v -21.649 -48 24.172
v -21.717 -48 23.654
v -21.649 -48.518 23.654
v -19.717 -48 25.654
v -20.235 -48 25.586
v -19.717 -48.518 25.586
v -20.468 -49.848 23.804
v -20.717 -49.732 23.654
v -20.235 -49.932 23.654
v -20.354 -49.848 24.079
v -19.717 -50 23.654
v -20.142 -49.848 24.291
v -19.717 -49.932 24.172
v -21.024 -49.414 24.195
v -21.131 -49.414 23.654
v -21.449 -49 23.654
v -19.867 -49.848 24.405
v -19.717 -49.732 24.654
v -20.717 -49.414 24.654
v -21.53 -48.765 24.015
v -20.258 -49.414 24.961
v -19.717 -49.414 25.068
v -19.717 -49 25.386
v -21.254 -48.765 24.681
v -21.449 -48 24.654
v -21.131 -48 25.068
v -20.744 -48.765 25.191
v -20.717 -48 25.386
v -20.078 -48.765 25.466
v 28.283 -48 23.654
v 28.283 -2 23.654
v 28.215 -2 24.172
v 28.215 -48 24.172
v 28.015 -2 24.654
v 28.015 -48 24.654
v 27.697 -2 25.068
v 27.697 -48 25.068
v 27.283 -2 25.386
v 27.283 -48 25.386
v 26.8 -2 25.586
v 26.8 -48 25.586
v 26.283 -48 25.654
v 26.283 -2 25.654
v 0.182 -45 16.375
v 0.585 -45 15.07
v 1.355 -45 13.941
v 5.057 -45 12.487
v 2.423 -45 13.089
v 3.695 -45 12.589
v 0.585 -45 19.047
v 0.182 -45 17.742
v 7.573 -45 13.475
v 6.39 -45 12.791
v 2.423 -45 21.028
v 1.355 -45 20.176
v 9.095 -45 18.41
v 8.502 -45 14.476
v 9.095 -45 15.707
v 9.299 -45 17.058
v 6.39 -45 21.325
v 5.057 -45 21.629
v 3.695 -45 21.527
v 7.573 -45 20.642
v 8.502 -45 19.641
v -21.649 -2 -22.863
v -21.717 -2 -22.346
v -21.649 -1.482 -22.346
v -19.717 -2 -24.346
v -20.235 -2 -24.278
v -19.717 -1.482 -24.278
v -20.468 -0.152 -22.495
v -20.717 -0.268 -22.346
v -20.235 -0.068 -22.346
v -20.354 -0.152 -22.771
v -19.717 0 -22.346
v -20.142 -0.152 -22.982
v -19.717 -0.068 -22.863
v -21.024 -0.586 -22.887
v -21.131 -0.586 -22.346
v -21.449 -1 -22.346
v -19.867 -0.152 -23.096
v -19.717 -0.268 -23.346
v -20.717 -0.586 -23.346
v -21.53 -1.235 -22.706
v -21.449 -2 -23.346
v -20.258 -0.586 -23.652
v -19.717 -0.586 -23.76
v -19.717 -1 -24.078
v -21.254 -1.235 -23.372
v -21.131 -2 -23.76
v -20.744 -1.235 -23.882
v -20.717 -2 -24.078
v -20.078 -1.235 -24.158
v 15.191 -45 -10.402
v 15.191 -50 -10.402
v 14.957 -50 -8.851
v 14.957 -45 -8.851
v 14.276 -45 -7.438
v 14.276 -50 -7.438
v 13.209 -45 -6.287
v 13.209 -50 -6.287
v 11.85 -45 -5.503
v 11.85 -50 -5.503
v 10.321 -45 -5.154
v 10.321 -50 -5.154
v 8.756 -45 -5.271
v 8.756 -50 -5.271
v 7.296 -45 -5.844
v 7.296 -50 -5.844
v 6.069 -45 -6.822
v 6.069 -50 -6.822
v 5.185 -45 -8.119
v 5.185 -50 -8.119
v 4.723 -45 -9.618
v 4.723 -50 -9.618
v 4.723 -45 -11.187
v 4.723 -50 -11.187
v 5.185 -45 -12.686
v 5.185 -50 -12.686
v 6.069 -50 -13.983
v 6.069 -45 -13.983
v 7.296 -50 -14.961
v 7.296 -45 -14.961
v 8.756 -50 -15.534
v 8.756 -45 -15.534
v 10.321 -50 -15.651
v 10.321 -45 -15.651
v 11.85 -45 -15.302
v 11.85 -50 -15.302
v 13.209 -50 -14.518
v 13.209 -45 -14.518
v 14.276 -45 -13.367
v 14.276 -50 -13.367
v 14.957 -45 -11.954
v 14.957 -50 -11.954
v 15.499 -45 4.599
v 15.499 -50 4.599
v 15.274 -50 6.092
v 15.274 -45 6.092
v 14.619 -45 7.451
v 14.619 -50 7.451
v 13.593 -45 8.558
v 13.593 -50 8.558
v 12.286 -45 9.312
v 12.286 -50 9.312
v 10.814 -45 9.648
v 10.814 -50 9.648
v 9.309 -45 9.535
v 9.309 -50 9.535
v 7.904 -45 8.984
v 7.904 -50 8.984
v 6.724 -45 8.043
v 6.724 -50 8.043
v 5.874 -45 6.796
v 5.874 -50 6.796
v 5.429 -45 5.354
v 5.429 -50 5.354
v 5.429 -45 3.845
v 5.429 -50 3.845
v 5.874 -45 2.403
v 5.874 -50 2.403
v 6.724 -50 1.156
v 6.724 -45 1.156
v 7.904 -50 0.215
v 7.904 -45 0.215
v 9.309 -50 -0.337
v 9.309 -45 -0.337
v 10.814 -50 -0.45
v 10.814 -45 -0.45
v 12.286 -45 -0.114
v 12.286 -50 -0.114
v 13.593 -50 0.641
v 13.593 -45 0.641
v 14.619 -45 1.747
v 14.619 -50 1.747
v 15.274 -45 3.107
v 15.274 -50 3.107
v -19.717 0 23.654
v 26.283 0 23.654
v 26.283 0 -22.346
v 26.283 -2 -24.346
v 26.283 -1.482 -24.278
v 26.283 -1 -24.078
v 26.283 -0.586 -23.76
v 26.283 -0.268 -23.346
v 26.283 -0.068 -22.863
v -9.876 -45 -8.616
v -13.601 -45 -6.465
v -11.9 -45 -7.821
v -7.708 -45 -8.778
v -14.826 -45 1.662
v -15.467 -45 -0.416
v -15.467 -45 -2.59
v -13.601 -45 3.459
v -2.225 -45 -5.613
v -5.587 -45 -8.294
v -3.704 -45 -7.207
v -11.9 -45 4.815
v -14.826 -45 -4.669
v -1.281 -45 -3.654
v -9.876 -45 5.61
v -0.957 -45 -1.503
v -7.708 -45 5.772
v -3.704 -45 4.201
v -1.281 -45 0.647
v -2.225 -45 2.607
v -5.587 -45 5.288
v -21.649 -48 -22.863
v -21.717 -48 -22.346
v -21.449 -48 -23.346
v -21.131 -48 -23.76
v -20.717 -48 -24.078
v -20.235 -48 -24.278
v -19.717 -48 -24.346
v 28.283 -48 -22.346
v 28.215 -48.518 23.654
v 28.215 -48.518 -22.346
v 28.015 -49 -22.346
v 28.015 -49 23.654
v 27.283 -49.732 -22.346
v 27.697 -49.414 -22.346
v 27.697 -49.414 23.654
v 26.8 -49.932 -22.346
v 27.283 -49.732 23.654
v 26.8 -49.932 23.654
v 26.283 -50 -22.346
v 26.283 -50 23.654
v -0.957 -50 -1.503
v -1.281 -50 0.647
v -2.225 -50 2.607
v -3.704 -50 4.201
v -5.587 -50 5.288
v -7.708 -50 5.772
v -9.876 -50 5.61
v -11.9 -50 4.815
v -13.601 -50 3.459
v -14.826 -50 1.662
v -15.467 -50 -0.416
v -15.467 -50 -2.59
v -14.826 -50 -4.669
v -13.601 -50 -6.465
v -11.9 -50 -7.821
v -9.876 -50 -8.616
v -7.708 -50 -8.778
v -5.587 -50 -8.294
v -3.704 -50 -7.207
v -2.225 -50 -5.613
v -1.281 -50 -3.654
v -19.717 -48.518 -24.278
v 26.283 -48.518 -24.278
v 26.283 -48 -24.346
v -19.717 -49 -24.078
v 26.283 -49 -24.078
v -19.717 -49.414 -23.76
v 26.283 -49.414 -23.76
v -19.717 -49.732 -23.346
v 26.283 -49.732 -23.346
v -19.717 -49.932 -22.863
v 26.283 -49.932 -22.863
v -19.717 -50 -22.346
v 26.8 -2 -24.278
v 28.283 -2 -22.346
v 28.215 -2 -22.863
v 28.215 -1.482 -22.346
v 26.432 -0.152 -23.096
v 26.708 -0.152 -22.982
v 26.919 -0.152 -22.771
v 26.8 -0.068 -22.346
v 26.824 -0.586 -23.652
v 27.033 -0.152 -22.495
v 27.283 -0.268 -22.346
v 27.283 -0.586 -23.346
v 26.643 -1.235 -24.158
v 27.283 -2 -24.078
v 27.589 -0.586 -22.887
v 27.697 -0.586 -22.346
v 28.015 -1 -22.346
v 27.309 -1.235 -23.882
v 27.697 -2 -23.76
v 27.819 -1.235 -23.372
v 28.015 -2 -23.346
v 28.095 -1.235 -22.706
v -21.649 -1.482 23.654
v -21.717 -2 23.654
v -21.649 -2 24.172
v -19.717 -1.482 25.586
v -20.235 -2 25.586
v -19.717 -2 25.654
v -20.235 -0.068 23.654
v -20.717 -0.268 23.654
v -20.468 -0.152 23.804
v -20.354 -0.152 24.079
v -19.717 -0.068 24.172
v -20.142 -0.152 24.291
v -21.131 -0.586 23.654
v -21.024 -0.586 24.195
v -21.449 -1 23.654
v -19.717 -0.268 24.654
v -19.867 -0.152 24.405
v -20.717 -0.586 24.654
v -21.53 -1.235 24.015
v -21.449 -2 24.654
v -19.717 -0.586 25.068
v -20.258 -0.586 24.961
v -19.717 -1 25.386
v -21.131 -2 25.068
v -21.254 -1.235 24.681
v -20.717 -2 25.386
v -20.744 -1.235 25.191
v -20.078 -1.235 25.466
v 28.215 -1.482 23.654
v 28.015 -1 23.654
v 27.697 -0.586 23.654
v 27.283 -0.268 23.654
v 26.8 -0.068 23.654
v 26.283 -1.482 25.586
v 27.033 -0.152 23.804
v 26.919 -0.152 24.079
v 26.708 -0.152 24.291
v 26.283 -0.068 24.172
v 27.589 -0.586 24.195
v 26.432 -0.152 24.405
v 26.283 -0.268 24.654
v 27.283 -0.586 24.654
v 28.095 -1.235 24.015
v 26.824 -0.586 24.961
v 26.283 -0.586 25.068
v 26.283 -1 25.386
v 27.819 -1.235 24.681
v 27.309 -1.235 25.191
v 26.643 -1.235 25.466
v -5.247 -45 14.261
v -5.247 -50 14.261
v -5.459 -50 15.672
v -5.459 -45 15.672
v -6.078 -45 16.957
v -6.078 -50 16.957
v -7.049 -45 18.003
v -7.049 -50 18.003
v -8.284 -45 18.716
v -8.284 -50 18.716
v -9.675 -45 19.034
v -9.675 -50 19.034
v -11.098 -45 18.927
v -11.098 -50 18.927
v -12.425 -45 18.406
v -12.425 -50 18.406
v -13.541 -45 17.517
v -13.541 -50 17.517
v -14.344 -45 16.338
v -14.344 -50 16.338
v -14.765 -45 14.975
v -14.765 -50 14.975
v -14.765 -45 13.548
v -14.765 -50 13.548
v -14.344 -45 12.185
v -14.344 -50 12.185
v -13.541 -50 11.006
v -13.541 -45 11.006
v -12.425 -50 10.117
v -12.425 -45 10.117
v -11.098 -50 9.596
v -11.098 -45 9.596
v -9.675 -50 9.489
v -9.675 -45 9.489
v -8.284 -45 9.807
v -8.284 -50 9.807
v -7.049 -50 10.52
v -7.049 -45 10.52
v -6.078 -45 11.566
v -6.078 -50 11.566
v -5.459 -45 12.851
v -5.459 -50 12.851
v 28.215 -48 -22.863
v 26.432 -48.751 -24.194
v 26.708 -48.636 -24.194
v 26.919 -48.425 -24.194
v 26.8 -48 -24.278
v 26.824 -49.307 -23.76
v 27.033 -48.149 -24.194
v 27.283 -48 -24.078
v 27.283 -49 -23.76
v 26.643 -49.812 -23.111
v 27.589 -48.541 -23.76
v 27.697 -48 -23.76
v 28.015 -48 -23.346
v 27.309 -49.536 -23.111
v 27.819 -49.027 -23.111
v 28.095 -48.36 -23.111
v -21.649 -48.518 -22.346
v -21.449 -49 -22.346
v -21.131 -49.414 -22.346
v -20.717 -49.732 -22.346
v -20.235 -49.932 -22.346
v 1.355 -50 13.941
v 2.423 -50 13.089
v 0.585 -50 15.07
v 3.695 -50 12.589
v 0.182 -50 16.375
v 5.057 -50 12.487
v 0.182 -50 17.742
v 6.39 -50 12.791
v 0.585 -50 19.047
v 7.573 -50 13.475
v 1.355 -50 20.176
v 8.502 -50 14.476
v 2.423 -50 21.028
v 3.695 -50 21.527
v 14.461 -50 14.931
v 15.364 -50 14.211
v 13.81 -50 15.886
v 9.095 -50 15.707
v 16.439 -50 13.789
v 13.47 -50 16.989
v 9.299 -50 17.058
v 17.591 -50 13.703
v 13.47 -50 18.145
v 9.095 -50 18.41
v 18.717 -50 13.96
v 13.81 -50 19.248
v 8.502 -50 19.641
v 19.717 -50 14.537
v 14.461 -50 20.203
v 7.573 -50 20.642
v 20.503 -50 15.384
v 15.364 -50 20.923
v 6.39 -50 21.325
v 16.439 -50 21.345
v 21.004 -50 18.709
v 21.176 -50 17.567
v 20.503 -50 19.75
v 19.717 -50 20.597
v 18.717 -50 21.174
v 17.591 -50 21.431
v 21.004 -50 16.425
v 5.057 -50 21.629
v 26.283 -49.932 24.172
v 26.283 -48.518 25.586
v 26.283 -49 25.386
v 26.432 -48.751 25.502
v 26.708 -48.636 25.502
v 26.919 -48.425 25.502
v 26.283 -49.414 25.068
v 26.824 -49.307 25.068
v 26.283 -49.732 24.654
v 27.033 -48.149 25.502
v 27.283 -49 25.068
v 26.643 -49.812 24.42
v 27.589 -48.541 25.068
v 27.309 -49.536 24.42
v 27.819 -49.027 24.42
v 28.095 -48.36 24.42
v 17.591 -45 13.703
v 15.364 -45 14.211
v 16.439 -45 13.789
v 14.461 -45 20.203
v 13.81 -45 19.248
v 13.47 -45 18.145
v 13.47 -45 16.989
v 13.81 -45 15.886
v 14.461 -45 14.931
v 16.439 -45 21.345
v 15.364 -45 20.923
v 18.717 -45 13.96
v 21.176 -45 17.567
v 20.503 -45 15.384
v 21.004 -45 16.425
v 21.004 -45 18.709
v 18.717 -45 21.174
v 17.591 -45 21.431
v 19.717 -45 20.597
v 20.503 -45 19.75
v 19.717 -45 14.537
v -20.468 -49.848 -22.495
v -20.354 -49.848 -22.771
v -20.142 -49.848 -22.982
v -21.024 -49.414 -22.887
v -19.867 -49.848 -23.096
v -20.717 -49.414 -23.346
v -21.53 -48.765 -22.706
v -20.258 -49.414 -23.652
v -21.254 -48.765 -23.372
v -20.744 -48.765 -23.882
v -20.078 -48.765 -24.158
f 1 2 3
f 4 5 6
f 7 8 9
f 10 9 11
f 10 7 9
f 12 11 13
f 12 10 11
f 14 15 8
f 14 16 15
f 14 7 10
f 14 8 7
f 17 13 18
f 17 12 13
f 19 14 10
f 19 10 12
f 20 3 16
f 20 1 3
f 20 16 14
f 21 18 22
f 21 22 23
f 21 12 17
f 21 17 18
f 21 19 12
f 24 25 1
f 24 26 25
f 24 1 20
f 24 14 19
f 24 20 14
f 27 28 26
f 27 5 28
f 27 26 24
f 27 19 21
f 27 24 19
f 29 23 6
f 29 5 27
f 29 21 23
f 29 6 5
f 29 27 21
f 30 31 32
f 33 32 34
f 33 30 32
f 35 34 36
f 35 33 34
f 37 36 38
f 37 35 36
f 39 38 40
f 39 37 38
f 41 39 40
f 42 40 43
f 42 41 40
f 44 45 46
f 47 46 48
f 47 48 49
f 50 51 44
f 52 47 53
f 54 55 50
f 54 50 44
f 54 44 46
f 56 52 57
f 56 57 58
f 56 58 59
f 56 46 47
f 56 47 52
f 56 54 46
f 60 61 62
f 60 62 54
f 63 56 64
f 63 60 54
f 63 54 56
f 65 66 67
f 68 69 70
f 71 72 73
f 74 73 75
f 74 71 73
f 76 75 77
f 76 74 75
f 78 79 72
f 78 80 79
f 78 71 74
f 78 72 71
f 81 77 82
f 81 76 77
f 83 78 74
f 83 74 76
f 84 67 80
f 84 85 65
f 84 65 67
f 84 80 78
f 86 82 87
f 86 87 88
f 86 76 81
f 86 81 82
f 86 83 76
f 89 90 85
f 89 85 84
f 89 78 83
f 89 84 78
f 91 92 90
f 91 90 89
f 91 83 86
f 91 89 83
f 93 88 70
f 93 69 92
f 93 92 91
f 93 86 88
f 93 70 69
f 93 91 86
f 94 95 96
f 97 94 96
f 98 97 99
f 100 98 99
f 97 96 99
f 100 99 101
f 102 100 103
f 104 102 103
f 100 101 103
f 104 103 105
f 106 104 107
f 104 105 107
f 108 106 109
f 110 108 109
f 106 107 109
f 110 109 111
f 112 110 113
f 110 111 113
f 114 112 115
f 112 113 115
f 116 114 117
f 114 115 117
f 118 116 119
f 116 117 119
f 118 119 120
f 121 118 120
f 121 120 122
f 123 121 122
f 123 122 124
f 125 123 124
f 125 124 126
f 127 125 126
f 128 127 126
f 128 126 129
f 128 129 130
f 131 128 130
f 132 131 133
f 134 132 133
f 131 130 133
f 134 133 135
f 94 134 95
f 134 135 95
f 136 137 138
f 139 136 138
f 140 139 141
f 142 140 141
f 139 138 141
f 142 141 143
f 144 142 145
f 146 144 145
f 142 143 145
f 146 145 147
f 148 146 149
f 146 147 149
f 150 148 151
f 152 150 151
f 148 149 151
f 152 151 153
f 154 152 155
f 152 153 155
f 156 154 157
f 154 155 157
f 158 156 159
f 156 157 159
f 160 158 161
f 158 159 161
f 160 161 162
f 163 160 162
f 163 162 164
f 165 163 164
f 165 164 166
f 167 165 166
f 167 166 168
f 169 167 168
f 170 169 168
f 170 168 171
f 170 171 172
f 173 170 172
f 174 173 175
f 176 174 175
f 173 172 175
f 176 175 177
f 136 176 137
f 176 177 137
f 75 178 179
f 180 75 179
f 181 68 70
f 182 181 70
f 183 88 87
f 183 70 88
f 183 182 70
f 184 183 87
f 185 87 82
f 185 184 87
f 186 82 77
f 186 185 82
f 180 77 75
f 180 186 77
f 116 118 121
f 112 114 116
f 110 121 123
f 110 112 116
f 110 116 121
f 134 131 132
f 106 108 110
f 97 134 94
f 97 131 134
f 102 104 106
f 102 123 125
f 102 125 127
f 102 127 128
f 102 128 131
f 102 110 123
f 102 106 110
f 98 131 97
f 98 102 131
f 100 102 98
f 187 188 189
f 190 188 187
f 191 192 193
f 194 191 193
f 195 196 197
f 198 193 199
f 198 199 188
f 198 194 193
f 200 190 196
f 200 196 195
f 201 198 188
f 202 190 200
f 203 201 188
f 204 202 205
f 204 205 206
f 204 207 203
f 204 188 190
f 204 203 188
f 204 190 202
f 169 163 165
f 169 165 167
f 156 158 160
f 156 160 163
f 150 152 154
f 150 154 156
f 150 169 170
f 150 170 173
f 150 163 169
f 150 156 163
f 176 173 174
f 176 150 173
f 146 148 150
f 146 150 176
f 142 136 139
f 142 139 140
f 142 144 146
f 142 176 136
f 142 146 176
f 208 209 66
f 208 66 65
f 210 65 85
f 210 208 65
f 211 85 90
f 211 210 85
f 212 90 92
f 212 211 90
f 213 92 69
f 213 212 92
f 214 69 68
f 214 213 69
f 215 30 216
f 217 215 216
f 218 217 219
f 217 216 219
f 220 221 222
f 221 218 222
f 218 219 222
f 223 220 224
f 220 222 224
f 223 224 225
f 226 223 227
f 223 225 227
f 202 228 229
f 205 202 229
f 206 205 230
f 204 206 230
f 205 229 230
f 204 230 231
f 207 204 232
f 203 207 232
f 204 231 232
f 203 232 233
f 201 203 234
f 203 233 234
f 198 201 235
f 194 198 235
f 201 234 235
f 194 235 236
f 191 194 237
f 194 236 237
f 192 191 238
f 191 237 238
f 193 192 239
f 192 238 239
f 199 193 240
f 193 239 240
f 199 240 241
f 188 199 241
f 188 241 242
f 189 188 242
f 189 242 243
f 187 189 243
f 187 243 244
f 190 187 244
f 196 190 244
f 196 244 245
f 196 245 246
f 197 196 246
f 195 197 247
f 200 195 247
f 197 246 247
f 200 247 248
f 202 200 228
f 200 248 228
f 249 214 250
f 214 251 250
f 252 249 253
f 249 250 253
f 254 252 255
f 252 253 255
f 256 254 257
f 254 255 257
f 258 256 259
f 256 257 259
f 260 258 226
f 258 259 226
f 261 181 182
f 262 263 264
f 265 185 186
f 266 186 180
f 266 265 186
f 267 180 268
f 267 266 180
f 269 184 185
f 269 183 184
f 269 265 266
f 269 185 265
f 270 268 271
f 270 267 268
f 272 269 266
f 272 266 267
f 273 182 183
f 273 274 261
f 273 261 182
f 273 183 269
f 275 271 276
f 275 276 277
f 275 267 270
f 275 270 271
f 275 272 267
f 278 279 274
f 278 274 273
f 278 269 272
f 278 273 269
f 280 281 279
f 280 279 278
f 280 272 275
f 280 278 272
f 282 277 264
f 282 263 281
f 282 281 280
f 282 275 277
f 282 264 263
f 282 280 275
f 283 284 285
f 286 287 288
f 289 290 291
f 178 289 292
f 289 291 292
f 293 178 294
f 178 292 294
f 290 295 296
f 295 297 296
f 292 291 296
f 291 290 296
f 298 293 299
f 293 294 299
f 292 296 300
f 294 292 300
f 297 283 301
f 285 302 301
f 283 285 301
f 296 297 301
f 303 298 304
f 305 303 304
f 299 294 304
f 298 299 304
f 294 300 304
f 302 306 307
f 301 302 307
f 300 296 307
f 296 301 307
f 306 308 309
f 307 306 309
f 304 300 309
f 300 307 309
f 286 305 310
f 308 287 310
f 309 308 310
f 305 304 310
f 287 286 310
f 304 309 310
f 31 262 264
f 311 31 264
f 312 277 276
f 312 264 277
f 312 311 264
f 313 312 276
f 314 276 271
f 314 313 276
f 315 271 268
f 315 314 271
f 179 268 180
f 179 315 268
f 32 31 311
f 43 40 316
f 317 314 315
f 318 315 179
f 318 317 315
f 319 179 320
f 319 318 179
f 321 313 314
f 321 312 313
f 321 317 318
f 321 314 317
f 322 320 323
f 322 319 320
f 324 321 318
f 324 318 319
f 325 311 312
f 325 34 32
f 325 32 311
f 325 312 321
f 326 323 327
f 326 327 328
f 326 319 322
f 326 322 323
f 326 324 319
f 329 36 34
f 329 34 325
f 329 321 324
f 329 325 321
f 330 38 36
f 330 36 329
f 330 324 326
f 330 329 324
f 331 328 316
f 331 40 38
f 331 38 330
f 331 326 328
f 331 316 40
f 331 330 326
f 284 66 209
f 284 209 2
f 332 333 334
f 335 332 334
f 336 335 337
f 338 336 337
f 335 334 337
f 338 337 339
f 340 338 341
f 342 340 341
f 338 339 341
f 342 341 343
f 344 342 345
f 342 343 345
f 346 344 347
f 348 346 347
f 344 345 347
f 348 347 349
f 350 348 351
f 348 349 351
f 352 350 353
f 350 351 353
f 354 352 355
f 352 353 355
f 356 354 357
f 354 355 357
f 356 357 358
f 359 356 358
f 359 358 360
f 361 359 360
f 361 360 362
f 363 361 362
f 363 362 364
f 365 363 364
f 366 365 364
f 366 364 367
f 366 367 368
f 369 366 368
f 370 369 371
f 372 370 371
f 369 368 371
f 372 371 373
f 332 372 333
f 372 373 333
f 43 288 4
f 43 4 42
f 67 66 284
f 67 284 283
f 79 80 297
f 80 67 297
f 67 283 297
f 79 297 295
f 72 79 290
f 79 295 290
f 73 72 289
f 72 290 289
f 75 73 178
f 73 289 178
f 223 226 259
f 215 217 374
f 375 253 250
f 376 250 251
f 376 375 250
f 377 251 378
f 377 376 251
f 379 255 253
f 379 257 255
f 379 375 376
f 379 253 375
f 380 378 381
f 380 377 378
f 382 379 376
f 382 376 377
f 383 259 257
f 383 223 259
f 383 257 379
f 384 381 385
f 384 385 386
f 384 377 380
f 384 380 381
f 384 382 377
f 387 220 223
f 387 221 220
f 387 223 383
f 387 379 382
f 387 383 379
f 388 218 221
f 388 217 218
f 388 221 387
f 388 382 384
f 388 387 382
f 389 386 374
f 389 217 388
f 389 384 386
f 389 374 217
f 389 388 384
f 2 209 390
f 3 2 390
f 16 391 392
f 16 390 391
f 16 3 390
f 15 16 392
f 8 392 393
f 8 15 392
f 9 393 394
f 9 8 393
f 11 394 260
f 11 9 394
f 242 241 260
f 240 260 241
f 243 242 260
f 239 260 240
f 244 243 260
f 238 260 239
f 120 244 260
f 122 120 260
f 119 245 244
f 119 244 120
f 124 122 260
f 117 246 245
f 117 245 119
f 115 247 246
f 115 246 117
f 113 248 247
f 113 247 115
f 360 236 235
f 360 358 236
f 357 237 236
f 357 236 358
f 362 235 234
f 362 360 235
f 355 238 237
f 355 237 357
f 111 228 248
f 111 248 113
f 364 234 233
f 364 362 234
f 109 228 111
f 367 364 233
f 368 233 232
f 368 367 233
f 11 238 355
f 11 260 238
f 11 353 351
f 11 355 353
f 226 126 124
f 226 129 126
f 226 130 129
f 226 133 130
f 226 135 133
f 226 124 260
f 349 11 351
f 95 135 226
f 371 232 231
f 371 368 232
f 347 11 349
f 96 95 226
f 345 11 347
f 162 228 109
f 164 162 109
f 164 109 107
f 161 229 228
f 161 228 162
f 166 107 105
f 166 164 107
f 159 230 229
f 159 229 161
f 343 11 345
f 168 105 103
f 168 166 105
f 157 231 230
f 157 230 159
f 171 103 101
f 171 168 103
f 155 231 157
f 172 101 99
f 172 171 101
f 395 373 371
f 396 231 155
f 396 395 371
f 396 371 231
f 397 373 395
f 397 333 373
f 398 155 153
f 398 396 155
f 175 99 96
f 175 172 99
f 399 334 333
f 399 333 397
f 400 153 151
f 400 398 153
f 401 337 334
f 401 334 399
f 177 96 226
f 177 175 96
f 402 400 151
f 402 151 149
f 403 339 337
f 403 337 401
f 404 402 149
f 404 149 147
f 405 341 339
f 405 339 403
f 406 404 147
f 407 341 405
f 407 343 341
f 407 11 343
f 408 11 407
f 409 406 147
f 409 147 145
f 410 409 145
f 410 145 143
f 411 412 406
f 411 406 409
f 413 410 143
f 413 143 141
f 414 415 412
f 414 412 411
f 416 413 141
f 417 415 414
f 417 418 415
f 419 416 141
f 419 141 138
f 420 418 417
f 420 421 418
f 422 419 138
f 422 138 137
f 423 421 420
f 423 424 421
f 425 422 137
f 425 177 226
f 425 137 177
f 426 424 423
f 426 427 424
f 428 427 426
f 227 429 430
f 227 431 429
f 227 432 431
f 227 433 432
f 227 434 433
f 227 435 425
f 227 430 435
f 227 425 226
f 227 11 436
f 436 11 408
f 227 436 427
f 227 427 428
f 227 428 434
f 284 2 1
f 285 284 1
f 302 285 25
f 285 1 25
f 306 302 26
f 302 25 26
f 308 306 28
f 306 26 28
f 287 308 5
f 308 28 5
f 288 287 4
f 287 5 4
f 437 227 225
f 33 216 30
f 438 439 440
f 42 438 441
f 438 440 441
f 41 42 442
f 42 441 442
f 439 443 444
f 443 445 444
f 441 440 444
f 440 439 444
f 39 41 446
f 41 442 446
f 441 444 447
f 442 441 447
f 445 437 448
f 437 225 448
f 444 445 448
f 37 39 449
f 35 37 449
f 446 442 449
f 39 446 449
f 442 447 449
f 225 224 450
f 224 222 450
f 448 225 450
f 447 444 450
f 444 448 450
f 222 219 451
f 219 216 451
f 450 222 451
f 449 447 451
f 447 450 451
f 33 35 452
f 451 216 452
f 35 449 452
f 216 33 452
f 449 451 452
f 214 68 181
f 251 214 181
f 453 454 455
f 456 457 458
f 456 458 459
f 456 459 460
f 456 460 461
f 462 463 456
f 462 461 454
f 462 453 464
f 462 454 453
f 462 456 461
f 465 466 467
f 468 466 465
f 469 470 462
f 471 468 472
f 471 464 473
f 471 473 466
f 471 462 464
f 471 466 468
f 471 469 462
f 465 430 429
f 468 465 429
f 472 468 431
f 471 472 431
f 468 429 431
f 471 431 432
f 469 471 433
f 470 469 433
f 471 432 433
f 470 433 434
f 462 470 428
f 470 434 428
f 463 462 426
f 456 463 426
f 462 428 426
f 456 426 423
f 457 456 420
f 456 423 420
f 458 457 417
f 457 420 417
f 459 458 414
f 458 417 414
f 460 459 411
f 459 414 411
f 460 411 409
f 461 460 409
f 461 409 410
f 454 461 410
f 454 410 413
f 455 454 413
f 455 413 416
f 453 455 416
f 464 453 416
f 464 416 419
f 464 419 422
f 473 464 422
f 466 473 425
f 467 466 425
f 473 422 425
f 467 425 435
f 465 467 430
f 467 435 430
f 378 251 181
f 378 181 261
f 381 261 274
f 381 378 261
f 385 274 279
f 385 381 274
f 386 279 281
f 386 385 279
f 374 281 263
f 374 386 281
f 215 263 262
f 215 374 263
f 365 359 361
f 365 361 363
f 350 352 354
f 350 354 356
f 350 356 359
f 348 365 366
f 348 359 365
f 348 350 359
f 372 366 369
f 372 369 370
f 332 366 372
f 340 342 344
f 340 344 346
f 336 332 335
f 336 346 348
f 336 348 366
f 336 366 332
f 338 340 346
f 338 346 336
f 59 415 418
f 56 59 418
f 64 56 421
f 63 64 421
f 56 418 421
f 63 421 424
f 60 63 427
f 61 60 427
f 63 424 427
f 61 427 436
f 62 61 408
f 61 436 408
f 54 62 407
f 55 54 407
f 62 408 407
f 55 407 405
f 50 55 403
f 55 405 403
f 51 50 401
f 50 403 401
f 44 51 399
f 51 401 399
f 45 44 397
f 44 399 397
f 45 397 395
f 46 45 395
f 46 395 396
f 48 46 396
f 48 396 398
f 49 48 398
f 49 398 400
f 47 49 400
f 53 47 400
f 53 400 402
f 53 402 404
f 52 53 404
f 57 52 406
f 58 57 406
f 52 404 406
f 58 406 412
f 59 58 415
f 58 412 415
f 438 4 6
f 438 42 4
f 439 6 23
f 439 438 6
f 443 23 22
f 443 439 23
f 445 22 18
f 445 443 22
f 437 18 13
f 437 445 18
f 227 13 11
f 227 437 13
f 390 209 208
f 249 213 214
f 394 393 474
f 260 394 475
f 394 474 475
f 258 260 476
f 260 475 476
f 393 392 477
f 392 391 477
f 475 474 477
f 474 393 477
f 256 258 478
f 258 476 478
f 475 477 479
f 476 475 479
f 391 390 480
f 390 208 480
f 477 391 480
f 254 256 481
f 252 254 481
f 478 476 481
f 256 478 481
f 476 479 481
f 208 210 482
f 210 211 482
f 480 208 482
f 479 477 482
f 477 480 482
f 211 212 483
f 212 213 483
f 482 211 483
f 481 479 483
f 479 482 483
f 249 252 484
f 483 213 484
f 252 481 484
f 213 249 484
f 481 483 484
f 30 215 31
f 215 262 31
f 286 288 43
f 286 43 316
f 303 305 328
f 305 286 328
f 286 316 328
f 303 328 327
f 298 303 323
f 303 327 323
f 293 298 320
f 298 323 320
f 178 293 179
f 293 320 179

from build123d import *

# Parameters (mm, degrees)
F0_W     = 50
F0_H     = 50
F1_DEPTH = 50
F2_R     = 2
F3_R     = 4.785711
F3_R_2   = 7.295538
F3_R_3   = 5.063059
F3_R_4   = 4.583879
F3_R_5   = 3.87498
F3_R_6   = 5.263405
F4_DEPTH = 5


with BuildPart() as f1:
    # F0 (on Front) → F1 (new body)
    with BuildSketch(Plane.XZ):
        with Locations((3.28275, 0.654186)):
            Rectangle(F0_W, F0_H)
    extrude(amount=F1_DEPTH)

    # F2
    f2_edges = [f1.edges().sort_by_distance(p)[0] for p in [
        (-21.71725, -25, 25.654186),
        (-21.71725, -25, -24.345814),
        (-21.71725, 0, 0.654186),
        (-21.71725, -50, 0.654186),
        (28.28275, -50, 0.654186),
        (3.28275, -50, 25.654186),
        (3.28275, -50, -24.345814),
        (28.28275, -25, -24.345814),
        (3.28275, 0, -24.345814),
        (28.28275, -25, 25.654186),
        (28.28275, 0, 0.654186),
        (3.28275, 0, 25.654186),
    ]]
    fillet(f2_edges, radius=F2_R)

    # F3 (on face) → F4 (cut)
    with BuildSketch(Plane.XZ.offset(50)):
        with Locations((-10.032591, 14.261485)):
            Circle(F3_R)
        with Locations((-8.252717, -1.503121)):
            Circle(F3_R_2)
        with Locations((10.435971, 4.599307)):
            Circle(F3_R_3)
        with Locations((4.714944, 17.058432)):
            Circle(F3_R_4)
        with Locations((17.301202, 17.566968)):
            Circle(F3_R_5)
        with Locations((9.927436, -10.402496)):
            Circle(F3_R_6)
    extrude(amount=-F4_DEPTH, mode=Mode.SUBTRACT)


solid = f1.part
